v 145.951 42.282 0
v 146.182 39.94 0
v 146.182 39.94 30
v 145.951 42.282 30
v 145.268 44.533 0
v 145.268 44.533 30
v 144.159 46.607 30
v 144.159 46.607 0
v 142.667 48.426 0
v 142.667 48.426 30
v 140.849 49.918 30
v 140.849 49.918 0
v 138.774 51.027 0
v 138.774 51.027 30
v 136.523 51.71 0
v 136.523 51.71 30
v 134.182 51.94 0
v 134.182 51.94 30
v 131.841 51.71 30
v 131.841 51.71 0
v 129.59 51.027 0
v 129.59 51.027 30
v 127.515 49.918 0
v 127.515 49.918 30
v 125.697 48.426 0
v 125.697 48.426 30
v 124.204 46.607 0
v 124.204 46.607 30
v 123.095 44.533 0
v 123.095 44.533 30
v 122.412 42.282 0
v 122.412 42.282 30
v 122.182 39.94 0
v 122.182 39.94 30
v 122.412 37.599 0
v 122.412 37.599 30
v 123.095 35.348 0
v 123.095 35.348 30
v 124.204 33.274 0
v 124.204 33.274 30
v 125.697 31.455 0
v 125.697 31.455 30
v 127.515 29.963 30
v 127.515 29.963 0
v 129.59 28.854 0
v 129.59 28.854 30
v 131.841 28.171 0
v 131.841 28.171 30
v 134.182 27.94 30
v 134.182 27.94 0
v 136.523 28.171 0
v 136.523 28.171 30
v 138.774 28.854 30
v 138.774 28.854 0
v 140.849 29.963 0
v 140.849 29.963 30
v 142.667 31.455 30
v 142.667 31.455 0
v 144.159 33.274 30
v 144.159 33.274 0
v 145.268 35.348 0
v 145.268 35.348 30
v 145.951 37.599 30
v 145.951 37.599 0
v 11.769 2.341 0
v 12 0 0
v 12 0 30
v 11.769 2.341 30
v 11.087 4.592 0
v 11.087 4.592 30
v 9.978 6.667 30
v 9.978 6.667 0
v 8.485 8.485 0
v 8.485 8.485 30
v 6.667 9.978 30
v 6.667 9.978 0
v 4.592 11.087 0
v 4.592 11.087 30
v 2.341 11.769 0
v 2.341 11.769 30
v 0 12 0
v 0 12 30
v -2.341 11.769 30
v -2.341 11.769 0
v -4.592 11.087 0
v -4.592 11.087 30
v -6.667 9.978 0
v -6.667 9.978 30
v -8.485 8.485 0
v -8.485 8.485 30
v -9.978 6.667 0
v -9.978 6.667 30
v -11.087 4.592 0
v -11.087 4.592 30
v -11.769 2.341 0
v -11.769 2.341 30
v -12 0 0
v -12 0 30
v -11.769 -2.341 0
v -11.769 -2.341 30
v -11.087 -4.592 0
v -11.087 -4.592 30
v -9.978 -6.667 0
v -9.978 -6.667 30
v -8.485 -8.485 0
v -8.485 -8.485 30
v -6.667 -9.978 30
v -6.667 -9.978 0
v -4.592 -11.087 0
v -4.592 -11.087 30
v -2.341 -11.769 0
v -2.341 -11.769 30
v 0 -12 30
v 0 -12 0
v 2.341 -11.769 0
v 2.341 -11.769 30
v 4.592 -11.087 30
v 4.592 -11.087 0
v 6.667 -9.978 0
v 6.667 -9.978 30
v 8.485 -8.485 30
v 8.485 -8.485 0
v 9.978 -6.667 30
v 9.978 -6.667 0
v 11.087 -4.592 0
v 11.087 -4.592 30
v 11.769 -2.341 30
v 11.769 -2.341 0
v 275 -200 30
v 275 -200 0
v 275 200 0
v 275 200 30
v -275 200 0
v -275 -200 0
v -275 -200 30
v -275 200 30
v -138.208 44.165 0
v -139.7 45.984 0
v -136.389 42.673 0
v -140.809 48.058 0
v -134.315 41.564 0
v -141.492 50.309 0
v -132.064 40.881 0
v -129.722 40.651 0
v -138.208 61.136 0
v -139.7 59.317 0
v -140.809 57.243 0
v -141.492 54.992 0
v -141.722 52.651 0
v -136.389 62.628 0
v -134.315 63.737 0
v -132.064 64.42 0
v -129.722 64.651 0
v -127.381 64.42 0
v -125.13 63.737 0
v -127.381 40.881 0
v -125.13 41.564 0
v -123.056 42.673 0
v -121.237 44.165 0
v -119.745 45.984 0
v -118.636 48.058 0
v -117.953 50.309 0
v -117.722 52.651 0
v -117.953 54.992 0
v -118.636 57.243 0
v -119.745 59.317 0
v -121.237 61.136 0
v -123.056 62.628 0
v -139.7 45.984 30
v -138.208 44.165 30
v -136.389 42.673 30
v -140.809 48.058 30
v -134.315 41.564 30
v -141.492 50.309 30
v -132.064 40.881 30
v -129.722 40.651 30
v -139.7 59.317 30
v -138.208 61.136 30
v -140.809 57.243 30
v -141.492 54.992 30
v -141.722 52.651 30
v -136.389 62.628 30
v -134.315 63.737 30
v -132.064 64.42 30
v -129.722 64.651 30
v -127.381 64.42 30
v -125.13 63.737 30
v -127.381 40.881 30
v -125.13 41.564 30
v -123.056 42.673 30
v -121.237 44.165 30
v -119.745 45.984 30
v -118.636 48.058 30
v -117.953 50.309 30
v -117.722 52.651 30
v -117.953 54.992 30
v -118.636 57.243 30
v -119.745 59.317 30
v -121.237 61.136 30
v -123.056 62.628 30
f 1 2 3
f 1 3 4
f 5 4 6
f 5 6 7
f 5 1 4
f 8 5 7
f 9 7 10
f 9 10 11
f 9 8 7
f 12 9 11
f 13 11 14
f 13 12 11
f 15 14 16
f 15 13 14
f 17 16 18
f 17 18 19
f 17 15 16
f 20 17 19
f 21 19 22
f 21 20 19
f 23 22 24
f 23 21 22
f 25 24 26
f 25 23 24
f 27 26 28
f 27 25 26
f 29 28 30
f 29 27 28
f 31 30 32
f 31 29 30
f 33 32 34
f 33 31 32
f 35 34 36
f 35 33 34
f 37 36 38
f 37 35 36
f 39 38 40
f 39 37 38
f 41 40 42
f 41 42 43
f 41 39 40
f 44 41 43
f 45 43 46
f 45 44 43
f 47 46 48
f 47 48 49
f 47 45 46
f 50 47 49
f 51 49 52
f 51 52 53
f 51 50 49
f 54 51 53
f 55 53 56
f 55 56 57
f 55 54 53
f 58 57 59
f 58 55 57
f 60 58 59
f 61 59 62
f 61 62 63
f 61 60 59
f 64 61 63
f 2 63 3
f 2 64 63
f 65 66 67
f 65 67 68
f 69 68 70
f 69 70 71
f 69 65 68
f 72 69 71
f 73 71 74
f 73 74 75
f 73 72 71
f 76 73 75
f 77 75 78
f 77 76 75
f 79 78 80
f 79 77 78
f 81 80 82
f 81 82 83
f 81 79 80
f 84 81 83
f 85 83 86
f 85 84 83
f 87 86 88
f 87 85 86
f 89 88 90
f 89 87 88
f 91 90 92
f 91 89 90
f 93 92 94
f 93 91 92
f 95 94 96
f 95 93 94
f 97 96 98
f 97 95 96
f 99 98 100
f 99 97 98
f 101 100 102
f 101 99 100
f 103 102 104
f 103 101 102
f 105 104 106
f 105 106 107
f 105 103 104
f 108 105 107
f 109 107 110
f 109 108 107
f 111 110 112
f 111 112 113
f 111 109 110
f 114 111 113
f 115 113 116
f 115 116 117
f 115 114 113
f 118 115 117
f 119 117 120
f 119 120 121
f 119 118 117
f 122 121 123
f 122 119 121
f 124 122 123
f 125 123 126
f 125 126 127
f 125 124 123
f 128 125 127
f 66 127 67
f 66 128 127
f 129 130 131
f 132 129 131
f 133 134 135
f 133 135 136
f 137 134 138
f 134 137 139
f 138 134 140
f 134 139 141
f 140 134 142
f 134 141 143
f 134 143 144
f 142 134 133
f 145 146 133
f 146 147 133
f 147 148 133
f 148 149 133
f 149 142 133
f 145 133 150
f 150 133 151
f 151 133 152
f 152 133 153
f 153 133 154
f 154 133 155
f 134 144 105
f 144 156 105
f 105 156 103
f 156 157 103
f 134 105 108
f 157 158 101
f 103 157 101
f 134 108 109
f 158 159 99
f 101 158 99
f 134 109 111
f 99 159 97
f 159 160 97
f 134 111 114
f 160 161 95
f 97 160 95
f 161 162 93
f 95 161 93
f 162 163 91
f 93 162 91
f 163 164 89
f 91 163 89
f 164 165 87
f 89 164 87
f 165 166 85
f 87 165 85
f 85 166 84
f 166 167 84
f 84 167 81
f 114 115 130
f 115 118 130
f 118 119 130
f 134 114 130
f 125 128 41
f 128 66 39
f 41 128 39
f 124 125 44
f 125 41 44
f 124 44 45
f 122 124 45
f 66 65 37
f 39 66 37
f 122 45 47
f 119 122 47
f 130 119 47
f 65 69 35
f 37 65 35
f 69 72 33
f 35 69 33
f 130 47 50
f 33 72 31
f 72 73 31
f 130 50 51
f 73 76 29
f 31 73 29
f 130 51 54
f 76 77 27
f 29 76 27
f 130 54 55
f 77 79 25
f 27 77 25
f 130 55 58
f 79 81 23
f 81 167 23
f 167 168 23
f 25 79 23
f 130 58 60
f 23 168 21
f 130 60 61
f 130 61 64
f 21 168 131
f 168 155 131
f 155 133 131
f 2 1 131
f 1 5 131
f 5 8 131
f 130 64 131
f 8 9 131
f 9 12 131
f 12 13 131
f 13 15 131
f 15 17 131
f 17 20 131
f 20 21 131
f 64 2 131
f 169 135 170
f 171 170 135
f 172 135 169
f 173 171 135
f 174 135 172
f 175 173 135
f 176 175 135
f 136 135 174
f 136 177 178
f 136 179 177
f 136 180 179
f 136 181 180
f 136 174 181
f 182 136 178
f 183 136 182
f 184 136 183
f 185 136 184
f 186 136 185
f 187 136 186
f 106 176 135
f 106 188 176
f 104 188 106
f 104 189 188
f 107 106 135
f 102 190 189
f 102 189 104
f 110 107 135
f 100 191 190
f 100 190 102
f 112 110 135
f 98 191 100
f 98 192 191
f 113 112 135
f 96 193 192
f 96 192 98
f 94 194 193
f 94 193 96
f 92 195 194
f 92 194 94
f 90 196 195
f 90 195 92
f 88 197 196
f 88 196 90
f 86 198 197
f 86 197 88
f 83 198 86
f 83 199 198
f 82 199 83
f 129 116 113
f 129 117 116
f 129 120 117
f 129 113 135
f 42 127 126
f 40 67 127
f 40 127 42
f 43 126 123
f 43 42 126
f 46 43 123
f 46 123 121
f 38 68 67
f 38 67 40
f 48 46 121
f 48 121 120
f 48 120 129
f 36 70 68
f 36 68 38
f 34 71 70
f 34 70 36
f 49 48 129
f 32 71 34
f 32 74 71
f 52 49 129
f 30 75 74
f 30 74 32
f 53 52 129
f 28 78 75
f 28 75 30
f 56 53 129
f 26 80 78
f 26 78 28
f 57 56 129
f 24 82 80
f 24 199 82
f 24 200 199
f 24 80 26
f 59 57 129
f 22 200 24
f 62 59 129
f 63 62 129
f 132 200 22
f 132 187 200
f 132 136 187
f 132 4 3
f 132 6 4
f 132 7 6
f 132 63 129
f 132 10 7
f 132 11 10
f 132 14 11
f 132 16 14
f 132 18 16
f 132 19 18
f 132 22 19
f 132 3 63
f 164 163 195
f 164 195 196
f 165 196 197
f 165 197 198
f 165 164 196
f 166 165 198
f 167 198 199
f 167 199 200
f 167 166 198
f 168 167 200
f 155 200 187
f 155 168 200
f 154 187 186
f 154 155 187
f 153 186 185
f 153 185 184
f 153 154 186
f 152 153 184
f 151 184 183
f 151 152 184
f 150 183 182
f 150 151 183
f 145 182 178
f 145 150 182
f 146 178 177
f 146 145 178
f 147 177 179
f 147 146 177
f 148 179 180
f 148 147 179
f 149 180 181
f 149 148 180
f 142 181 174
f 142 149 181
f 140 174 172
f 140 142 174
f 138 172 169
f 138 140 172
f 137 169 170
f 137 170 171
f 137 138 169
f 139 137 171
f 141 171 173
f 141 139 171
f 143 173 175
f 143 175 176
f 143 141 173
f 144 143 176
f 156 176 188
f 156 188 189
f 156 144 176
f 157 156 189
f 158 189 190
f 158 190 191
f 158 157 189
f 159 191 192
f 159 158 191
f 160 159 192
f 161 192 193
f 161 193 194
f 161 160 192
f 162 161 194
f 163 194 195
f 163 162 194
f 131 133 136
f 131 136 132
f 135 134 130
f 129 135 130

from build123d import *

# Parameters (mm, degrees)
ESBO_O1_W                = 550
ESBO_O1_H                = 400
ESBO_O1_R                = 12
RESSALTO_EXTRUS_O1_DEPTH = 30


with BuildPart() as part:
    # Esboço1 → Ressalto-extrusão1 (new body)
    with BuildSketch(Plane.XY):
        Rectangle(ESBO_O1_W, ESBO_O1_H)
        with Locations((-129.722465626, 52.650564213)):
            Circle(ESBO_O1_R, mode=Mode.SUBTRACT)
        Circle(ESBO_O1_R, mode=Mode.SUBTRACT)
        with Locations((134.18182058, 39.940443486)):
            Circle(ESBO_O1_R, mode=Mode.SUBTRACT)
    extrude(amount=RESSALTO_EXTRUS_O1_DEPTH)


solid = part.part
